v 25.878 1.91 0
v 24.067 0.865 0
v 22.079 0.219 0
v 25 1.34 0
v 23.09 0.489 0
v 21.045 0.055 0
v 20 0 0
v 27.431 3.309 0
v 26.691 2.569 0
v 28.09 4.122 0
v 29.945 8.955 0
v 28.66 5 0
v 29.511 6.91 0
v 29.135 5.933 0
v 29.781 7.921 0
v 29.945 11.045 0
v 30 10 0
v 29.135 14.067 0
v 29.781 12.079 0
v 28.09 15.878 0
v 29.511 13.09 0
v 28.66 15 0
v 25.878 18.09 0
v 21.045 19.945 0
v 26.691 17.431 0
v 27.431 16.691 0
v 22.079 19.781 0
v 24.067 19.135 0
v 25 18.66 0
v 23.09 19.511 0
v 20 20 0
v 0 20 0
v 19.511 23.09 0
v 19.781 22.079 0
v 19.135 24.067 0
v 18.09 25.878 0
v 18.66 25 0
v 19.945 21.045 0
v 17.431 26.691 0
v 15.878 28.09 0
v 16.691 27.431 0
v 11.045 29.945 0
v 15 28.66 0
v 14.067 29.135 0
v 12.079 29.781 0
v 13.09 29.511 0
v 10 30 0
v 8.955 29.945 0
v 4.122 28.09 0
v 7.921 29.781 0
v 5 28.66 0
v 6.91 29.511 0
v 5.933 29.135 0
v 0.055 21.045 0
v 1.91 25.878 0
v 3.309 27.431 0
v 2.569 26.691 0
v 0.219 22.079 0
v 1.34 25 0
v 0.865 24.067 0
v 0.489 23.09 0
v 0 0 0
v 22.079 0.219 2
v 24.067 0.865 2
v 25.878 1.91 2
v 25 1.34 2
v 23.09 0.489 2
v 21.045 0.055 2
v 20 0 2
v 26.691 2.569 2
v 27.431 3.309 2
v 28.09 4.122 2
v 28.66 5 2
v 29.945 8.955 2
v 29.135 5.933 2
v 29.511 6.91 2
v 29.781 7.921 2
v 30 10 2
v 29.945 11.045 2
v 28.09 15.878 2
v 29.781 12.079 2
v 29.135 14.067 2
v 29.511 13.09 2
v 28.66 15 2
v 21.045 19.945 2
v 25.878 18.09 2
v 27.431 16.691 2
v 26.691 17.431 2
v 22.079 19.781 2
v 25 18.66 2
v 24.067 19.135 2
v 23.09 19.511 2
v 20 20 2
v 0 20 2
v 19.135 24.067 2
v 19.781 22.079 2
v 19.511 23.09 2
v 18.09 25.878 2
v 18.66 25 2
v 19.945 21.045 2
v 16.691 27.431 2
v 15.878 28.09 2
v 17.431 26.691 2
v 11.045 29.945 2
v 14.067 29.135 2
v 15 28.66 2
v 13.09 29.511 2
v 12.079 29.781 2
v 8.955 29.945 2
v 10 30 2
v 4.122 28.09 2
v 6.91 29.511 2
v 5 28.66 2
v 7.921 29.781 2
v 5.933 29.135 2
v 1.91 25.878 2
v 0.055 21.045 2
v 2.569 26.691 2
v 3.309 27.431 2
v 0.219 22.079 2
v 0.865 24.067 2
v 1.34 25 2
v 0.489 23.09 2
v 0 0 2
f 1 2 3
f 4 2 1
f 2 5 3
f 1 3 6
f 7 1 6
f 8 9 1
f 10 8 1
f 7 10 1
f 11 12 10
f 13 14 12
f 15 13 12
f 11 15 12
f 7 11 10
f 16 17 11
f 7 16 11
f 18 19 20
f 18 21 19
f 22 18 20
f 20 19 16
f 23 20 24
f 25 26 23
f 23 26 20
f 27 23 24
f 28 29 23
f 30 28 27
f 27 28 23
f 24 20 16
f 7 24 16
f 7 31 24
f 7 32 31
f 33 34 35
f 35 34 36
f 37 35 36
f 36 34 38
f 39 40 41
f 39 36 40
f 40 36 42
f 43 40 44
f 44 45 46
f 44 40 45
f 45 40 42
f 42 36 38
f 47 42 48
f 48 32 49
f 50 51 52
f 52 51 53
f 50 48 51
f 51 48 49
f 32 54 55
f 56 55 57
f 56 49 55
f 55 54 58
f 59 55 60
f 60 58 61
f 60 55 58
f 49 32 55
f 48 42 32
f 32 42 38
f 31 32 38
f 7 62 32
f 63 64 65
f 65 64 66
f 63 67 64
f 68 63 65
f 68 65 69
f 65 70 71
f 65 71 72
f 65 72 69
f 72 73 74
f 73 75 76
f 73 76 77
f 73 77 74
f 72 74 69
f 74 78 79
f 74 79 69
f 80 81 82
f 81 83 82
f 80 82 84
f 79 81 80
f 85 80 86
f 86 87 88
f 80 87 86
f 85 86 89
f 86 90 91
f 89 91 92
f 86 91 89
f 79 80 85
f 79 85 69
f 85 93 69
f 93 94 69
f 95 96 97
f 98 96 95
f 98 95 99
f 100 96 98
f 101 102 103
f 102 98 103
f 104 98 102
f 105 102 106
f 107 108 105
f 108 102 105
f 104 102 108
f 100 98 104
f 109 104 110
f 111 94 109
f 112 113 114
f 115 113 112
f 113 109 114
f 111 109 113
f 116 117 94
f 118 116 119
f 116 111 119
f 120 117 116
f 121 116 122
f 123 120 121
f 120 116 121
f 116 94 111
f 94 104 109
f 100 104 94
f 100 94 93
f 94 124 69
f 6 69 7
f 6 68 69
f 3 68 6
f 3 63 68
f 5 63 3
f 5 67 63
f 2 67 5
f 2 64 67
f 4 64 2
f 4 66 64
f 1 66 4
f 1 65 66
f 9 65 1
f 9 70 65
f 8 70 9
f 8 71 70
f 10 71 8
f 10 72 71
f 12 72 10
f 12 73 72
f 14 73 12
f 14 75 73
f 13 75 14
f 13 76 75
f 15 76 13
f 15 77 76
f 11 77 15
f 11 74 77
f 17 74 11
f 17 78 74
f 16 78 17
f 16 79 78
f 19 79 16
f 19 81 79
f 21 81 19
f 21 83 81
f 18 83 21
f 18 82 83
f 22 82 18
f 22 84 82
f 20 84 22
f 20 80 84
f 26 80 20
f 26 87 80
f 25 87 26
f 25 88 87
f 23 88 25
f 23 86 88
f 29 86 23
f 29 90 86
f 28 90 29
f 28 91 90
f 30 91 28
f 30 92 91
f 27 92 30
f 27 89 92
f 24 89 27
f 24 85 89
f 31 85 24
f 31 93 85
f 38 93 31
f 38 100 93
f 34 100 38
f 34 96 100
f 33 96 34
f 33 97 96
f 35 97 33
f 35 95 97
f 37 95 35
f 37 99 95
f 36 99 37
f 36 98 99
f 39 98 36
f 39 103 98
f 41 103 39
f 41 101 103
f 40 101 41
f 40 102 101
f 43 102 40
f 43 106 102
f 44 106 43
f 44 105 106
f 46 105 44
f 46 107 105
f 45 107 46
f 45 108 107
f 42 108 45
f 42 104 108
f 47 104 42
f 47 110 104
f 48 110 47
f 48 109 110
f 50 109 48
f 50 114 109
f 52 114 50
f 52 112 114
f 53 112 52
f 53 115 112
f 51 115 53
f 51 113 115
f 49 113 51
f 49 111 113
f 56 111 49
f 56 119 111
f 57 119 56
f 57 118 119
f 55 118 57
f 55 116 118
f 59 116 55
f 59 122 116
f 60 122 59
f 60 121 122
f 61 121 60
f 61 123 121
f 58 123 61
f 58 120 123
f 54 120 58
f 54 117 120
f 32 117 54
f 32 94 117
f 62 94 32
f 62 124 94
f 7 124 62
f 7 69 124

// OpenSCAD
$fn = 60;

text_thick = 1;
heart_size = 20;
heart_thick = 2;

module flat_heart() {
  union() {
    // Base square
    square([heart_size, heart_size]);

    // Circle near top-left corner
    translate([heart_size/2, heart_size])
      circle(r = heart_size/2);

    // Circle near top-right corner
    translate([heart_size, heart_size/2])
      circle(r = heart_size/2);
  }
}

//rotate([0,0,-45])
//translate([-13,15,heart_thick])
//linear_extrude(height = text_thick)
//text("Test");
linear_extrude(height = heart_thick)
flat_heart();
